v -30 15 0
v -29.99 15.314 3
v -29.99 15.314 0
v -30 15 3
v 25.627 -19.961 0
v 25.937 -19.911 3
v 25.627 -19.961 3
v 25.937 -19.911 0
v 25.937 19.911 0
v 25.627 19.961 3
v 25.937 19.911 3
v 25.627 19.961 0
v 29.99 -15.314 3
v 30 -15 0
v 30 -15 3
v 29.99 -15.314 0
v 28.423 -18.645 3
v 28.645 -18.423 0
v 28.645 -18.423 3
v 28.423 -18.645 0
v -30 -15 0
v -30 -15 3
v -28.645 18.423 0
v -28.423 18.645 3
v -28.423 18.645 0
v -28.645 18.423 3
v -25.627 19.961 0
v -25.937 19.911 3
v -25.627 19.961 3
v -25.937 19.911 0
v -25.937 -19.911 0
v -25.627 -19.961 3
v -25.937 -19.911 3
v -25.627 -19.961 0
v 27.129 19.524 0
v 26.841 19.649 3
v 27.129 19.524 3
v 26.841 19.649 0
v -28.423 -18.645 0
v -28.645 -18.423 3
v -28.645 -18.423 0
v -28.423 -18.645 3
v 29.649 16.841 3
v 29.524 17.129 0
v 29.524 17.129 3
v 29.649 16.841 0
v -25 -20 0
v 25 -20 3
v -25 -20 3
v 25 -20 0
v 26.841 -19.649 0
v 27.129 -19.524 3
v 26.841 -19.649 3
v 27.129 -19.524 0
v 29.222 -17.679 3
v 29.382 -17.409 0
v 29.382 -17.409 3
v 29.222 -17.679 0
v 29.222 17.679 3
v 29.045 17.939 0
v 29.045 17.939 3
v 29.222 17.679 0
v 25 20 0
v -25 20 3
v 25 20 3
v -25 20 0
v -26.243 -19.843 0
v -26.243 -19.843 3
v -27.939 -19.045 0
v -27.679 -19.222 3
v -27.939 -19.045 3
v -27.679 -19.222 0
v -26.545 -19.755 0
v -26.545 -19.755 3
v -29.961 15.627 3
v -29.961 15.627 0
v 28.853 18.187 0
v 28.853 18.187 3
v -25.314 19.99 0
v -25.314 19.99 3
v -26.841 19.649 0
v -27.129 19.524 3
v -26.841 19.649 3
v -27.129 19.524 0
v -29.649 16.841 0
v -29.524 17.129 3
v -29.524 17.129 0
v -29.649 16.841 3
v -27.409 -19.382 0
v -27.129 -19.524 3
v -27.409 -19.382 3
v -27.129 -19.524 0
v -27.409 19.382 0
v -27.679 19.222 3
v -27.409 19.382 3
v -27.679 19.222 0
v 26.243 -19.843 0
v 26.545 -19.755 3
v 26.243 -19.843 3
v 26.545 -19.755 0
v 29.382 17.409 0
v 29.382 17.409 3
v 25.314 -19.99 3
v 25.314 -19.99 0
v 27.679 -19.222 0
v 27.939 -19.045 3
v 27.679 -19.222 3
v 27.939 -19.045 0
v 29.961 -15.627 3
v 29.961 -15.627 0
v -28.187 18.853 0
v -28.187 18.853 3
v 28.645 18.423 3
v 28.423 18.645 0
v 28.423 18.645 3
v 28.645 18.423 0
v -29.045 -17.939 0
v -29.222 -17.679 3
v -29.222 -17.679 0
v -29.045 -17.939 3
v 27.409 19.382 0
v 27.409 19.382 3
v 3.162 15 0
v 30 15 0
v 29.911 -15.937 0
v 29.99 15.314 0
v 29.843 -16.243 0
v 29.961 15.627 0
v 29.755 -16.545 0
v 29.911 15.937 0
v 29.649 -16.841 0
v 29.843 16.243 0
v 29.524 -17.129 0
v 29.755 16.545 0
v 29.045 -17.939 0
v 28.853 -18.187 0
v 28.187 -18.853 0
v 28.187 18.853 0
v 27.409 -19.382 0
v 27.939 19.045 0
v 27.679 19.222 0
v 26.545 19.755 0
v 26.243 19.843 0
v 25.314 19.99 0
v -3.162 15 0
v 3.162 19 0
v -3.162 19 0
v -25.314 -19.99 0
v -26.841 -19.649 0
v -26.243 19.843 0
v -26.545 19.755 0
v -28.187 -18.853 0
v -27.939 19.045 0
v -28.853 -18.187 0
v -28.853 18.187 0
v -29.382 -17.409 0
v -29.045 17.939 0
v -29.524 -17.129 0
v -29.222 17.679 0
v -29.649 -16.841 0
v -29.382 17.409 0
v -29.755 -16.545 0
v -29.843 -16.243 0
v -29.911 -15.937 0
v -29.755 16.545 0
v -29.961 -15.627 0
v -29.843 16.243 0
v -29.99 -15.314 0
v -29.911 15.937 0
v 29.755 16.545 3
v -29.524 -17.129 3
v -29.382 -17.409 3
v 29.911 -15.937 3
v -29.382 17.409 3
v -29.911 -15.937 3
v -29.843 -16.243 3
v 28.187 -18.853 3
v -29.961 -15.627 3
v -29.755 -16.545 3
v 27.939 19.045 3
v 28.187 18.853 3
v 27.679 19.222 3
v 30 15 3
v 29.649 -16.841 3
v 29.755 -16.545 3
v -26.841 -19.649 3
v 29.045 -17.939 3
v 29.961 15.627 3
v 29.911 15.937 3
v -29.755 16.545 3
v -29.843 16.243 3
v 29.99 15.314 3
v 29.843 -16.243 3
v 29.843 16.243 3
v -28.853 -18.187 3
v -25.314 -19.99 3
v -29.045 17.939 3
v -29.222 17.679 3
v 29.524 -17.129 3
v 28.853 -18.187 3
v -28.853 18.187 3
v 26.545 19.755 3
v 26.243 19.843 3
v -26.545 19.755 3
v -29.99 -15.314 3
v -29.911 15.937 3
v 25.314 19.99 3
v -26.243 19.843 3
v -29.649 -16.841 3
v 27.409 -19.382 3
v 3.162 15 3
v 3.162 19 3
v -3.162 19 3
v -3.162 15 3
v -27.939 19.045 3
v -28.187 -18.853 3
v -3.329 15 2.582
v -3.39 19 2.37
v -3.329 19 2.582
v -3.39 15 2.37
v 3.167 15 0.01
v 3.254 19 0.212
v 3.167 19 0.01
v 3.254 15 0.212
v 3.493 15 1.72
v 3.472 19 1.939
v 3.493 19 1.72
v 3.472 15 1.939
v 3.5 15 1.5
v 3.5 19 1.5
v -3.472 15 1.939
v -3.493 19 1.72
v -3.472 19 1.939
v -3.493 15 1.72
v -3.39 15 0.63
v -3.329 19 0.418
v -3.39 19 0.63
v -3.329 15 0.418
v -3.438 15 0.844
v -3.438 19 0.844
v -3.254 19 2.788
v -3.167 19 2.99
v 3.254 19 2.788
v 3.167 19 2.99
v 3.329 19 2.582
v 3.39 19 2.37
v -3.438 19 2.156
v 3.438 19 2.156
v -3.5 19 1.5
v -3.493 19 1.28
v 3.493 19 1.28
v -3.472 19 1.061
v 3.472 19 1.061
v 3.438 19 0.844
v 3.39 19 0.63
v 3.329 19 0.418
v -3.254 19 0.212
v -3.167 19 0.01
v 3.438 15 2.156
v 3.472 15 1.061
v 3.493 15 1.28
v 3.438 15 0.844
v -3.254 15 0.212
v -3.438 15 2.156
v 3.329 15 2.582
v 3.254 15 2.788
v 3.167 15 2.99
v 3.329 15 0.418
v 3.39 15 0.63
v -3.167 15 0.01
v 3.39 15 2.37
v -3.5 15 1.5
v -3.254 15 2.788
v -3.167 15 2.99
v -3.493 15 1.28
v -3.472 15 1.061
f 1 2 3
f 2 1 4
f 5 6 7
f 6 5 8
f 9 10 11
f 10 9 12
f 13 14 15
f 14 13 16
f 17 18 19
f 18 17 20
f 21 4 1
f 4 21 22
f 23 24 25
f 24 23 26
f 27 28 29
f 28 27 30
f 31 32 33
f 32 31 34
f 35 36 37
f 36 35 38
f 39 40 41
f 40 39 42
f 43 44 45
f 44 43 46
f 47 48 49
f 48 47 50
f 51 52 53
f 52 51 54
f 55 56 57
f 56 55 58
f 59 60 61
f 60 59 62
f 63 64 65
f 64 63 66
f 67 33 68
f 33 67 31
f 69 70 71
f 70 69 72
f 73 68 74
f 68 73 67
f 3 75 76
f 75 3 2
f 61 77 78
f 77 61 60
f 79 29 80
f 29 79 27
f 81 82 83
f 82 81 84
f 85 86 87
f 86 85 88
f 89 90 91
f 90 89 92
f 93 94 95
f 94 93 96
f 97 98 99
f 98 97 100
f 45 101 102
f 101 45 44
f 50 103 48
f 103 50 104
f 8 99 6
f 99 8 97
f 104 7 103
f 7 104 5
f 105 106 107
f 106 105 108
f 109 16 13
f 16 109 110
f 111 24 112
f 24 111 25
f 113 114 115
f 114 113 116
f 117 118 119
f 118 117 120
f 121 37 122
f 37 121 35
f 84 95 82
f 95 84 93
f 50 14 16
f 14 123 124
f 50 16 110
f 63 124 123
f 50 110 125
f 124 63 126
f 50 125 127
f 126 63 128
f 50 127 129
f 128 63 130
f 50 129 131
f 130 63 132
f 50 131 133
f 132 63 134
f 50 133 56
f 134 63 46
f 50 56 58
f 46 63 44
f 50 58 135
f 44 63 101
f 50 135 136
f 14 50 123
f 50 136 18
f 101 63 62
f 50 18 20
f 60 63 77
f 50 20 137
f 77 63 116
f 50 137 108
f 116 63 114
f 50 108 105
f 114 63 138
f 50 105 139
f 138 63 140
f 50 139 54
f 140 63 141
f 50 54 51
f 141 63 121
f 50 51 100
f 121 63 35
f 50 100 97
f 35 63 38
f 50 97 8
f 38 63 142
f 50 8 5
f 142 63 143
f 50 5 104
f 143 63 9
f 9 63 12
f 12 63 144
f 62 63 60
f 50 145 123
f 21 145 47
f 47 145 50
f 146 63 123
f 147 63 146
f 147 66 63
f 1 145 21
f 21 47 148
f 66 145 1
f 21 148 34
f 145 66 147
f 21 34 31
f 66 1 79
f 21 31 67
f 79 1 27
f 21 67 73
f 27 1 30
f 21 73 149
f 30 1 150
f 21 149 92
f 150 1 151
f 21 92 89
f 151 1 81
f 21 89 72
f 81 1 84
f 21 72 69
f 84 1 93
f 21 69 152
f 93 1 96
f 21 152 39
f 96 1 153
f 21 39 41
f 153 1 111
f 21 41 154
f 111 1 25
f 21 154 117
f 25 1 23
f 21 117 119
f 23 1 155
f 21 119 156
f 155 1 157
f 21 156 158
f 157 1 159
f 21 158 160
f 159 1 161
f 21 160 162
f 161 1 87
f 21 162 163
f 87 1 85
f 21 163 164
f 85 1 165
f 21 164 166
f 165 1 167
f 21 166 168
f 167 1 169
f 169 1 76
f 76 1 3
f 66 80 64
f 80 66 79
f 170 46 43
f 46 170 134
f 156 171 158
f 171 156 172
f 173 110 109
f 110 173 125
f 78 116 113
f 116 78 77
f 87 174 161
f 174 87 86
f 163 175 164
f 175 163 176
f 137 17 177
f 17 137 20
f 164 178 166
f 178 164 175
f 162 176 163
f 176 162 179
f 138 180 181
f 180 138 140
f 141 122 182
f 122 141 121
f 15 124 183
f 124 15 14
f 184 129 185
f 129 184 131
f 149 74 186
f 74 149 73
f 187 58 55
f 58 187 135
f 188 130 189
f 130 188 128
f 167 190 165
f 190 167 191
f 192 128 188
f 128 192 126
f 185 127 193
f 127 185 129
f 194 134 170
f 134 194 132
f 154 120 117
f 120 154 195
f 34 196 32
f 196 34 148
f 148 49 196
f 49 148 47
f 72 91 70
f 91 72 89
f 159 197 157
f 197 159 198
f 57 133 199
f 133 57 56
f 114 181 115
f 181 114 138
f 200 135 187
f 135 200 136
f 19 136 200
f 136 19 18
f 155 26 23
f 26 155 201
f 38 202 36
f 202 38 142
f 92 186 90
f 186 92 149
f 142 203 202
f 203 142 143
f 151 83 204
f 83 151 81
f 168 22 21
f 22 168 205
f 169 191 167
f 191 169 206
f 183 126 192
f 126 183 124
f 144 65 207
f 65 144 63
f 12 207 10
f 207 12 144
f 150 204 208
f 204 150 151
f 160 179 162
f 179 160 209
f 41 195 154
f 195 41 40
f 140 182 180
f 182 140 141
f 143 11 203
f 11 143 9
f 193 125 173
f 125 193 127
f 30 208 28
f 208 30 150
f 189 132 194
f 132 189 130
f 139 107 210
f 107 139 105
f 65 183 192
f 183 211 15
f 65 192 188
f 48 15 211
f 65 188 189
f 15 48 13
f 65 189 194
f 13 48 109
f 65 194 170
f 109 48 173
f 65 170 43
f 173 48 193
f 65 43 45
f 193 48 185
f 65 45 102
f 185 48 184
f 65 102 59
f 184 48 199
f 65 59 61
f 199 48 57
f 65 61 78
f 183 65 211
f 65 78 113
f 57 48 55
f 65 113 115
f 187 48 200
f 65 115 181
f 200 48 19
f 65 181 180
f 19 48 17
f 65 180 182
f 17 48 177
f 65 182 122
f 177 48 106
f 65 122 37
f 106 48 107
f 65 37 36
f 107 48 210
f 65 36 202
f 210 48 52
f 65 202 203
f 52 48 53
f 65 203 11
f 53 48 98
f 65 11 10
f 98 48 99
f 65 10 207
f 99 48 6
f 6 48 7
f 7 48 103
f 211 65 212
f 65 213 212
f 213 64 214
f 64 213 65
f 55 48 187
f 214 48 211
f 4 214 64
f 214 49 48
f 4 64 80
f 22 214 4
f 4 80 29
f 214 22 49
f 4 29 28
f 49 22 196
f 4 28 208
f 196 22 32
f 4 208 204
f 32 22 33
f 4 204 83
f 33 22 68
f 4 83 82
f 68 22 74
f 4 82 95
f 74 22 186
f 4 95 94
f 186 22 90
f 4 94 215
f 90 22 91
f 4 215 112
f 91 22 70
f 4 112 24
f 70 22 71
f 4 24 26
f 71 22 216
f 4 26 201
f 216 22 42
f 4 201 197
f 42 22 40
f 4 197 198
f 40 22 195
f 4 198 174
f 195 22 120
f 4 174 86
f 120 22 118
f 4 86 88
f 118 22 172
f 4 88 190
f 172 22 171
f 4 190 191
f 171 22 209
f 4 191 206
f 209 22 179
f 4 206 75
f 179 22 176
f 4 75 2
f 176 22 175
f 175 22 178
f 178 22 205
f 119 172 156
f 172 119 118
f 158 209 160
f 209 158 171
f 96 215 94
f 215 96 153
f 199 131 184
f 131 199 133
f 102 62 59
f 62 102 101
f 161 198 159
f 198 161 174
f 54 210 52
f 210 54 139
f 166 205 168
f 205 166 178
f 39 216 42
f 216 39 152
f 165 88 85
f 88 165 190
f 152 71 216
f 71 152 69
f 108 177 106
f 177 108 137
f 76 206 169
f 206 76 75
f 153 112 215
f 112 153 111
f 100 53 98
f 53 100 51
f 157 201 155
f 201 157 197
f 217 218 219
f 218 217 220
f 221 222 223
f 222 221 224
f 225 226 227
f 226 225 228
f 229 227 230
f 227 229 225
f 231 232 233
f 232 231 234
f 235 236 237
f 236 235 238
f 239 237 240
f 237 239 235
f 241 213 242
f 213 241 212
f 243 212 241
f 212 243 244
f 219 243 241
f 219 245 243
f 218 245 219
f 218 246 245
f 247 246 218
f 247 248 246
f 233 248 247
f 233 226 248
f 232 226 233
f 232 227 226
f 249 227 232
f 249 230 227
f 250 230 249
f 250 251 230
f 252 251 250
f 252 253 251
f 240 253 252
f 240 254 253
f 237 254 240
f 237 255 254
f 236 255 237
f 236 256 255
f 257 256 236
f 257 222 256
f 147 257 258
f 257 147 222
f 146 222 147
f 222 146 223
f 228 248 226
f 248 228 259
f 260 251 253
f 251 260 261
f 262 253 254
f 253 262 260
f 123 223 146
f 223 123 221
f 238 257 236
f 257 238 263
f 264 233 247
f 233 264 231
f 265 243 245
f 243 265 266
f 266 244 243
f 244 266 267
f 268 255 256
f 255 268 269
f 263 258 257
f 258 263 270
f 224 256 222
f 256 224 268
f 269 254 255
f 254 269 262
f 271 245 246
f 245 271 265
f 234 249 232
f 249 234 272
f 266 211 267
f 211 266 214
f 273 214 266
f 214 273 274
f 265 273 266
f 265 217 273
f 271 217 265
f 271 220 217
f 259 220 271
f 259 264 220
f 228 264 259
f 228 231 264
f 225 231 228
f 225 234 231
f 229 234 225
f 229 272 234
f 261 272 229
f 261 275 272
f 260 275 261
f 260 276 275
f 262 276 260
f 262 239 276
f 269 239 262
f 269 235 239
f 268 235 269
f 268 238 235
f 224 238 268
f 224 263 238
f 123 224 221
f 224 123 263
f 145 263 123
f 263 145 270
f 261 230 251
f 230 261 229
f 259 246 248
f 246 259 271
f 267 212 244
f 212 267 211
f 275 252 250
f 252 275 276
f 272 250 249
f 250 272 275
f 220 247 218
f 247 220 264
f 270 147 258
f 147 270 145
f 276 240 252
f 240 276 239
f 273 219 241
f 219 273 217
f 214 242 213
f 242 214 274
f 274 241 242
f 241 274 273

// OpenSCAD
$fn = 100;

// Parâmetros do chaveiro
largura = 60;
altura = 40;
espessura = 3;
raio_canto = 5;
raio_furo = 3.5;
margem_topo = 3;

// Base retangular com cantos arredondados
module base_chaveiro_retangular() {
    linear_extrude(height = espessura)
        offset(r = raio_canto)
            square([largura - 2*raio_canto, altura - 2*raio_canto], center = true);
}

// Furo para chaveiro
module furo_chaveiro() {
    translate([0, altura/2 - margem_topo, espessura/2])
        rotate([90, 0, 0])
            cylinder(h = espessura + 1, r = raio_furo, center = true);
}

// Logo em DXF - POSIÇÃO HIPER-REBAIXADA
module logo_dxf() {
    translate([-35, -33, 2])  // Y = -19.5 (MÁXIMO PRATICÁVEL)
        scale([0.2, 0.2, 1])
            linear_extrude(height = 2)
                import("logo.dxf", center = true);
}

// Resultado final
difference() {
    union() {
        base_chaveiro_retangular();
        logo_dxf();
    }
    furo_chaveiro();
}
